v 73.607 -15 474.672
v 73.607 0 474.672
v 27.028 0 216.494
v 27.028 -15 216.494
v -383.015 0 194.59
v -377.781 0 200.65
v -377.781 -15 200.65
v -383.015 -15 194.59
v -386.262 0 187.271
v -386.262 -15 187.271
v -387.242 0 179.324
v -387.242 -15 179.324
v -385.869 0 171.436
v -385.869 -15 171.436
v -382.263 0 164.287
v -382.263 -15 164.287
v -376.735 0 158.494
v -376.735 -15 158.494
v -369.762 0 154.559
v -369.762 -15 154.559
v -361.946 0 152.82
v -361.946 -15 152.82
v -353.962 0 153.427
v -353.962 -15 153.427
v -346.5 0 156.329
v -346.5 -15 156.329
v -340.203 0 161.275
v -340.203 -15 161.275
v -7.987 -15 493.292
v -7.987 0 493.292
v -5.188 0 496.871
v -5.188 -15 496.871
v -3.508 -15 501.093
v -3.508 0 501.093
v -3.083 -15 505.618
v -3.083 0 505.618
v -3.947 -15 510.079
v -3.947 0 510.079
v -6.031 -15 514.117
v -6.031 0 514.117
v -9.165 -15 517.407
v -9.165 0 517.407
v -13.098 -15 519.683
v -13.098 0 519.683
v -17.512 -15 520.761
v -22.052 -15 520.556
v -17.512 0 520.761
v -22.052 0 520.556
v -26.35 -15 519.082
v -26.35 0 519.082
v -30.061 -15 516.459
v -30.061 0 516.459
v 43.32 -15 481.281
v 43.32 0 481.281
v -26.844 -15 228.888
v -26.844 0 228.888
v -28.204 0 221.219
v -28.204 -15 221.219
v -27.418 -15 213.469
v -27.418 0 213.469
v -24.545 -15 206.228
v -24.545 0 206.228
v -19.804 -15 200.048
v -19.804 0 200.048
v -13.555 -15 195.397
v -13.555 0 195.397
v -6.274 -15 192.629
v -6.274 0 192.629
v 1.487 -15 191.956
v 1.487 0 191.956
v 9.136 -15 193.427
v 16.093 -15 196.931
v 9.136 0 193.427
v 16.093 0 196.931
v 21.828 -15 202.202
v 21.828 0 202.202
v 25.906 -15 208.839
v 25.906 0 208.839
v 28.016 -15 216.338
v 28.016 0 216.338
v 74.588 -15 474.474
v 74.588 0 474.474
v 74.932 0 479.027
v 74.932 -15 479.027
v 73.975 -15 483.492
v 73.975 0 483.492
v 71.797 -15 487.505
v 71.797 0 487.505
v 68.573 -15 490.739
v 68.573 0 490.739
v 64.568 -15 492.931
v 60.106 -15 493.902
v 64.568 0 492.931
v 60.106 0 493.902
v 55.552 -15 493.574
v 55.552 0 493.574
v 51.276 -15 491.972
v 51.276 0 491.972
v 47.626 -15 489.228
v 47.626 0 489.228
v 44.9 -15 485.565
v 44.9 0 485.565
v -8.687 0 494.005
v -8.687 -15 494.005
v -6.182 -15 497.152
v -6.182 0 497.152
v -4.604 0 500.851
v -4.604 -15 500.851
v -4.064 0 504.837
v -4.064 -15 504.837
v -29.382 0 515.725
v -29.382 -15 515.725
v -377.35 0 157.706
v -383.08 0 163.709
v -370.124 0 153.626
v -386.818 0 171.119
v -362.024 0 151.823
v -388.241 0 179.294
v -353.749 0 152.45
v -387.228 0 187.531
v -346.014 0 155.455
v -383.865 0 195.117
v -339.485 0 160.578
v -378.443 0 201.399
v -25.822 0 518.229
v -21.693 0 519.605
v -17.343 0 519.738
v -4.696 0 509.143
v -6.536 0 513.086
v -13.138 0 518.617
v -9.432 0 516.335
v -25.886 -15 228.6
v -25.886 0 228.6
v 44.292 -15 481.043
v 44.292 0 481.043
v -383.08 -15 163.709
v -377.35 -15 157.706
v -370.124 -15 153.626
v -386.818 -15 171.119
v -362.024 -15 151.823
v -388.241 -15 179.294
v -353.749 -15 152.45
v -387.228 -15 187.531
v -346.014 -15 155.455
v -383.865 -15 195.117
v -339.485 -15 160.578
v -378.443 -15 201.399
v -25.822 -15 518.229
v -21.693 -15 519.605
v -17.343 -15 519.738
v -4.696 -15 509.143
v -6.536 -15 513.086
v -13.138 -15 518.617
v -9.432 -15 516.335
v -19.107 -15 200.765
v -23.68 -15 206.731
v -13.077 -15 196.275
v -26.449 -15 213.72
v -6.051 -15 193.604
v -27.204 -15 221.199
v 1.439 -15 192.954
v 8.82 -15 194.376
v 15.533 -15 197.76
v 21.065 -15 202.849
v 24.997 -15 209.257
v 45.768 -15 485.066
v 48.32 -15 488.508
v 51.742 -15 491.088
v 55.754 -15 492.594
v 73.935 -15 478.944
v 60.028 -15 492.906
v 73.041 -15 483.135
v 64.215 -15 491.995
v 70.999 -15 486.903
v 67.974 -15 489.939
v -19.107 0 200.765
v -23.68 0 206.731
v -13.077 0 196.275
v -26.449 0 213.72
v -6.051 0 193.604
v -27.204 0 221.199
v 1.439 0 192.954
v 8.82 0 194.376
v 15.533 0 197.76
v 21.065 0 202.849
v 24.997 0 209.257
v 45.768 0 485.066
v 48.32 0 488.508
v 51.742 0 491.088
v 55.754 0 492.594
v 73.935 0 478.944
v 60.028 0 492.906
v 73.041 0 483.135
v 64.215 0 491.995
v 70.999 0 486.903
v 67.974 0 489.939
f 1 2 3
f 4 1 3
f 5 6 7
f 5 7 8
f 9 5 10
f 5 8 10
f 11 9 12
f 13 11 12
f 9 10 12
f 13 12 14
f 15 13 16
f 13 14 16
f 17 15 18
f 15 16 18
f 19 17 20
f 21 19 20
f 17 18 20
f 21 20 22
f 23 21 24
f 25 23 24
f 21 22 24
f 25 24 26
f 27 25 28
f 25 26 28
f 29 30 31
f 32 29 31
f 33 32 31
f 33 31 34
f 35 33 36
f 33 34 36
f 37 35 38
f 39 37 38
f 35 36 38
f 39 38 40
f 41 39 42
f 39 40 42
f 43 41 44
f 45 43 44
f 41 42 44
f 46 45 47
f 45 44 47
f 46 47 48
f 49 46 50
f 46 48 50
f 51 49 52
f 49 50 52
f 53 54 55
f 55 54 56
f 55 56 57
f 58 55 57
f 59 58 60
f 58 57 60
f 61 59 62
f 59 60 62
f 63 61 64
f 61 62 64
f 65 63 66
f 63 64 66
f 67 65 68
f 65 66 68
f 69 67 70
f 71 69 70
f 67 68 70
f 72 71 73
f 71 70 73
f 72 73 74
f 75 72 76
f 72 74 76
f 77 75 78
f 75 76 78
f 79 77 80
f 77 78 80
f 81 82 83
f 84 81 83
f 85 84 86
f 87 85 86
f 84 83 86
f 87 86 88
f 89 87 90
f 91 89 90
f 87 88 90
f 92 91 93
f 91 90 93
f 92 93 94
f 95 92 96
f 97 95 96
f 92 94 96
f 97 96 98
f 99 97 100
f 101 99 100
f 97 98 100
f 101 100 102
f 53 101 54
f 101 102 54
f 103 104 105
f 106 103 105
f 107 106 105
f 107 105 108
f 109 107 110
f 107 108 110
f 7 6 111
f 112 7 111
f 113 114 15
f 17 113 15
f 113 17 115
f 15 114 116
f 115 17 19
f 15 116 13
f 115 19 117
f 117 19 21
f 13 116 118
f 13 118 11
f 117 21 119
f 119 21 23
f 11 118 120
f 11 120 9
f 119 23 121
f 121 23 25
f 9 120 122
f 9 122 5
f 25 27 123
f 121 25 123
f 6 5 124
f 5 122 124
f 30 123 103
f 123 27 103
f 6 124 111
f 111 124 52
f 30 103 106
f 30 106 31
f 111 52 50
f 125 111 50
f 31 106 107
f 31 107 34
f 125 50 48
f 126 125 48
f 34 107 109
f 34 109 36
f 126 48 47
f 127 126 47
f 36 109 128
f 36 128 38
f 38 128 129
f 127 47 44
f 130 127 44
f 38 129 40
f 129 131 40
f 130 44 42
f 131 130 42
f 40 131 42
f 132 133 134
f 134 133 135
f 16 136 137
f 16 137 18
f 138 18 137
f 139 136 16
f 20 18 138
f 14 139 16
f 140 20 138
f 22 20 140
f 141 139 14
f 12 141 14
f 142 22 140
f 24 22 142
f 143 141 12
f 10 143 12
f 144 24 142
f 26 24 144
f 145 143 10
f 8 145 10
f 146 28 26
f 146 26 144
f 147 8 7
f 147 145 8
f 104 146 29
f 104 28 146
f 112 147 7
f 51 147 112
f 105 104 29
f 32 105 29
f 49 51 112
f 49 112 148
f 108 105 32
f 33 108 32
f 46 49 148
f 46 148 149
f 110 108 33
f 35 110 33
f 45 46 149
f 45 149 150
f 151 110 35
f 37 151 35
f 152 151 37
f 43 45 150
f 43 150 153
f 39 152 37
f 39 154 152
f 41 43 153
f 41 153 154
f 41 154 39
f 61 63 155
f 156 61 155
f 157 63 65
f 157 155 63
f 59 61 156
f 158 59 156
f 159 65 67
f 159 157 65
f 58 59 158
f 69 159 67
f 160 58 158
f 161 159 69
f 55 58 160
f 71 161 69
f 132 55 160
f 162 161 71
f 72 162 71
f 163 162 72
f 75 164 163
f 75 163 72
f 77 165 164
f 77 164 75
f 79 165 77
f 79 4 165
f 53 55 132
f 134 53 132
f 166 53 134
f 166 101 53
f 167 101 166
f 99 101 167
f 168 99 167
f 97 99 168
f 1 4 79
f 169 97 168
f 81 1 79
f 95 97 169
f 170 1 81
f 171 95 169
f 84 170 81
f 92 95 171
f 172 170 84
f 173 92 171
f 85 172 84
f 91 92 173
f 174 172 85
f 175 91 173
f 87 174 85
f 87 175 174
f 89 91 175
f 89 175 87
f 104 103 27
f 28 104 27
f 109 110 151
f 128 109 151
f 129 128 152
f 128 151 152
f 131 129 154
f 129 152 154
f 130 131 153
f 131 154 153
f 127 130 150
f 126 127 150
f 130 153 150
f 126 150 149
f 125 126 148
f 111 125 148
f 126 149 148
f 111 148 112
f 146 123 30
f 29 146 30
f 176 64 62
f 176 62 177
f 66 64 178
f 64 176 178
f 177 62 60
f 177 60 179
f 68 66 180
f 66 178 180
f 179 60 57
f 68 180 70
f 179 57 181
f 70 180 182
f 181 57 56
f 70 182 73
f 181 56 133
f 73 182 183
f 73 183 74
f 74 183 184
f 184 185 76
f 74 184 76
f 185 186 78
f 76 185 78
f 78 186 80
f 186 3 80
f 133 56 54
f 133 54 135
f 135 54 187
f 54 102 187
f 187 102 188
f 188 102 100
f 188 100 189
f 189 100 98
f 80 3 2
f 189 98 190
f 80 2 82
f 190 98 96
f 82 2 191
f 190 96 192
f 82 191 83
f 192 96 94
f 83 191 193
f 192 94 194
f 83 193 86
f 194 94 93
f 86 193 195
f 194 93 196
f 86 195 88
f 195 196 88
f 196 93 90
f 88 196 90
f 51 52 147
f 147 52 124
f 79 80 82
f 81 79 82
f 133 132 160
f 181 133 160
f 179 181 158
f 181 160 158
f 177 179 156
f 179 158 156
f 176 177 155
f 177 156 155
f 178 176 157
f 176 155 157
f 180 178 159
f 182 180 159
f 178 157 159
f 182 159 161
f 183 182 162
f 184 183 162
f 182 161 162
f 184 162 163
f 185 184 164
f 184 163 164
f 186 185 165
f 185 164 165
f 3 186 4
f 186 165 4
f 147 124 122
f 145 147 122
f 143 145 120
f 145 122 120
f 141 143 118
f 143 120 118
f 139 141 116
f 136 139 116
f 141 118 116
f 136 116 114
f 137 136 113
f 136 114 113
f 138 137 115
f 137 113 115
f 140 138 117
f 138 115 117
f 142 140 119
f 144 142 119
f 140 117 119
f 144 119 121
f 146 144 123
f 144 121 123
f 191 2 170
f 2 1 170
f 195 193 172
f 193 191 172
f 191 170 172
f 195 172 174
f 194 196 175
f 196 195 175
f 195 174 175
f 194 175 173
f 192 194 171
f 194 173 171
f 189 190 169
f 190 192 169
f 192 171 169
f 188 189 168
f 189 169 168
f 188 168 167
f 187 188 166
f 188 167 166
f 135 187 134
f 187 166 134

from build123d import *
from build123d import SkipClean  # not in build123d's __all__

# Parameters (mm, degrees)
F1_DEPTH  = 15
F2_R      = 8
F2_R_2    = 3
F3_DEPTH  = 10
F4_R      = 8
F4_R_2    = 3
F5_DEPTH  = 10
F6_R      = 8
F6_R_2    = 3
F7_DEPTH  = 10
F8_R      = 27.25
F8_R_2    = 15
F9_DEPTH  = 20
F11_R     = 15
F11_R_2   = 27.25
F12_DEPTH = 20


with BuildPart() as f1:
    # F0 (on Front) → F1 (new body)
    with BuildSketch(Plane.XZ):
        with BuildLine():
            ThreePointArc((-378.4425772317, 201.3993888944), (-386.4820244342, 170.1630857548), (-360, 151.75))
            ThreePointArc((-360, 151.75), (-348.8330724465, 154.0507759458), (-339.4850899056, 160.5783377689))
            Line((-339.4850899056, 160.5783377689), (-7.9870573254, 493.2915694615))
            ThreePointArc((-7.9870573254, 493.2915694615), (-7.480425283, 515.8738544687), (-30.0608082206, 516.4591565815))
            Line((-30.0608082206, 516.4591565815), (-378.4425772317, 201.3993888944))
        make_face()
        with BuildLine():
            ThreePointArc((-342.5, 180), (-347.6256313292, 167.6256313292), (-360, 162.5))
            ThreePointArc((-360, 162.5), (-376.0857600208, 186.8919028253), (-347.3301148646, 192.071620051))
            ThreePointArc((-347.3301148646, 192.071620051), (-343.7523387857, 186.5010387682), (-342.5, 180))
        make_face(mode=Mode.SUBTRACT)
        with BuildLine():
            ThreePointArc((-340.2025834833, 161.275022049), (-332.7500455353, 180.0498163798), (-340.2711788606, 198.7972369366))
            ThreePointArc((-340.2711788606, 198.7972369366), (-358.6559201587, 207.2168320967), (-377.7807722421, 200.6496159401))
            Line((-377.7807722421, 200.6496159401), (-29.3815729723, 515.7251467174))
            ThreePointArc((-29.3815729723, 515.7251467174), (-34.059394529, 505.2200757083), (-29.9241906854, 494.4898091415))
            ThreePointArc((-29.9241906854, 494.4898091415), (-19.406287314, 489.8408113075), (-8.6873810185, 494.0054865673))
            Line((-8.6873810185, 494.0054865673), (-340.2025834833, 161.275022049))
        make_face(mode=Mode.SUBTRACT)
        with BuildLine():
            ThreePointArc((-16.0642891408, 504.8369120424), (-17.949825352, 502.0515986913), (-21.2362694497, 502.7674914622))
            ThreePointArc((-21.2362694497, 502.7674914622), (-20.1787529296, 507.6222253934), (-16.0642891408, 504.8369120424))
        make_face(mode=Mode.SUBTRACT)
    extrude(amount=F1_DEPTH)

    # F4 (on face) → F5 (join)
    with BuildSketch(Plane.XZ.offset(15)):
        with Locations((-19.0642891408, 504.8369120424)):
            Circle(F4_R)
        with Locations((-19.0642891408, 504.8369120424)):
            Circle(F4_R_2, mode=Mode.SUBTRACT)
    extrude(amount=F5_DEPTH)

    # F11 (on face) → F12 (cut, symmetric)
    with BuildSketch(Plane.XZ.offset(15)):
        with Locations((-19.0642891408, 504.8369120424)):
            Circle(F11_R)
        with Locations((-360, 180)):
            Circle(F11_R_2)
    with SkipClean():  # cleaning this boolean's faces spoils the solid; the shape is the same uncleaned
        extrude(amount=F12_DEPTH, both=True, mode=Mode.SUBTRACT)


with BuildPart() as f1b:
    # F0 (on Front) → F1, piece 2 (new body)
    with BuildSketch(Plane.XZ):
        with BuildLine():
            ThreePointArc((-224.660632779, 532.8994691874), (-247.0029596883, 497.3937658802), (-209.3929270309, 478.8109786144))
            Line((-209.3929270309, 478.8109786144), (4.2800251225, 551.6775062268))
            ThreePointArc((4.2800251225, 551.6775062268), (15.2214539509, 571.3907533569), (-4.4127934903, 582.4733209582))
            Line((-4.4127934903, 582.4733209582), (-224.660632779, 532.8994691874))
        make_face()
        with BuildLine():
            ThreePointArc((-202.3153298886, 505.0680922919), (-237.1501331245, 502.669218229), (-202.9729980908, 509.8205505625))
            ThreePointArc((-202.9729980908, 509.8205505625), (-202.4805266526, 507.4669663547), (-202.3153298886, 505.0680922919))
        make_face(mode=Mode.SUBTRACT)
        with BuildLine():
            ThreePointArc((-4.1701281966, 581.5029225476), (-13.2448658651, 574.4081273865), (-14.6131340506, 562.9706965429))
            ThreePointArc((-14.6131340506, 562.9706965429), (-7.4667919525, 553.9348179807), (3.9795568505, 552.6315889697))
            Line((3.9795568505, 552.6315889697), (-209.7391973494, 479.7494419911))
            ThreePointArc((-209.7391973494, 479.7494419911), (-195.37987596, 493.0069525734), (-193.589413232, 512.4683487418))
            ThreePointArc((-193.589413232, 512.4683487418), (-205.2909288271, 528.1246374322), (-224.4651790674, 531.9184442936))
            Line((-224.4651790674, 531.9184442936), (-4.1701281966, 581.5029225476))
        make_face(mode=Mode.SUBTRACT)
        with BuildLine():
            ThreePointArc((2.8231503475, 567.0442322034), (0.2343859011, 564.0725516487), (-3.0641065321, 566.2295250713))
            ThreePointArc((-3.0641065321, 566.2295250713), (-0.5880852061, 570.0159127581), (2.8231503475, 567.0442322034))
        make_face(mode=Mode.SUBTRACT)
    extrude(amount=F1_DEPTH)

    # F6 (on face) → F7 (join)
    with BuildSketch(Plane.XZ.offset(15)):
        with Locations((-0.1768496525, 567.0442322034)):
            Circle(F6_R)
        with Locations((-0.1768496525, 567.0442322034)):
            Circle(F6_R_2, mode=Mode.SUBTRACT)
    extrude(amount=F7_DEPTH)


with BuildPart() as f1c:
    # F0 (on Front) → F1, piece 3 (new body)
    with BuildSketch(Plane.XZ):
        with BuildLine():
            ThreePointArc((-26.8437130081, 228.8884241481), (-6.2735642109, 192.6293687538), (28.0157804914, 216.3378263061))
            Line((28.0157804914, 216.3378263061), (74.5878668874, 474.4741693703))
            ThreePointArc((74.5878668874, 474.4741693703), (62.3717320494, 493.5768497593), (43.3204306097, 481.2807421686))
            Line((43.3204306097, 481.2807421686), (-26.8437130081, 228.8884241481))
        make_face()
        with BuildLine():
            ThreePointArc((17.526619941, 220.1678904943), (-13.6575690894, 209.2595005773), (3.9274233032, 237.2276013104))
            ThreePointArc((3.9274233032, 237.2276013104), (13.7108089714, 231.0762804113), (17.526619941, 220.1678904943))
        make_face(mode=Mode.SUBTRACT)
        with BuildLine():
            ThreePointArc((44.2921973879, 481.0427708065), (46.331220076, 469.862073162), (55.6248700068, 463.3203849774))
            ThreePointArc((55.6248700068, 463.3203849774), (66.9752801691, 465.2587472424), (73.607367574, 474.6717422905))
            Line((73.607367574, 474.6717422905), (27.027861197, 216.4942723007))
            ThreePointArc((27.027861197, 216.4942723007), (22.4337443248, 235.6754137282), (6.1007280336, 246.7322973366))
            ThreePointArc((6.1007280336, 246.7322973366), (-13.4116938297, 243.8738860018), (-25.8860157877, 228.5998422013))
            Line((-25.8860157877, 228.5998422013), (44.2921973879, 481.0427708065))
        make_face(mode=Mode.SUBTRACT)
        with BuildLine():
            ThreePointArc((61.9684157458, 477.9429942484), (60.8384254459, 475.5971332717), (58.299706598, 475.0184723942))
            ThreePointArc((58.299706598, 475.0184723942), (57.0984060458, 480.288855225), (61.9684157458, 477.9429942484))
        make_face(mode=Mode.SUBTRACT)
    extrude(amount=F1_DEPTH)

    # F2 (on face) → F3 (join)
    with BuildSketch(Plane.XZ.offset(15)):
        with Locations((58.9684157458, 477.9429942484)):
            Circle(F2_R)
        with Locations((58.9684157458, 477.9429942484)):
            Circle(F2_R_2, mode=Mode.SUBTRACT)
    with SkipClean():  # cleaning this boolean's faces spoils the solid; the shape is the same uncleaned
        extrude(amount=F3_DEPTH)

    # F8 (on face) → F9 (cut, symmetric)
    with BuildSketch(Plane.XZ.offset(15)):
        with Locations((0.026619941, 220.1678904943)):
            Circle(F8_R)
        with Locations((58.9684157458, 477.9429942484)):
            Circle(F8_R_2)
    extrude(amount=F9_DEPTH, both=True, mode=Mode.SUBTRACT)


solid = Compound([f1.part, f1c.part])
